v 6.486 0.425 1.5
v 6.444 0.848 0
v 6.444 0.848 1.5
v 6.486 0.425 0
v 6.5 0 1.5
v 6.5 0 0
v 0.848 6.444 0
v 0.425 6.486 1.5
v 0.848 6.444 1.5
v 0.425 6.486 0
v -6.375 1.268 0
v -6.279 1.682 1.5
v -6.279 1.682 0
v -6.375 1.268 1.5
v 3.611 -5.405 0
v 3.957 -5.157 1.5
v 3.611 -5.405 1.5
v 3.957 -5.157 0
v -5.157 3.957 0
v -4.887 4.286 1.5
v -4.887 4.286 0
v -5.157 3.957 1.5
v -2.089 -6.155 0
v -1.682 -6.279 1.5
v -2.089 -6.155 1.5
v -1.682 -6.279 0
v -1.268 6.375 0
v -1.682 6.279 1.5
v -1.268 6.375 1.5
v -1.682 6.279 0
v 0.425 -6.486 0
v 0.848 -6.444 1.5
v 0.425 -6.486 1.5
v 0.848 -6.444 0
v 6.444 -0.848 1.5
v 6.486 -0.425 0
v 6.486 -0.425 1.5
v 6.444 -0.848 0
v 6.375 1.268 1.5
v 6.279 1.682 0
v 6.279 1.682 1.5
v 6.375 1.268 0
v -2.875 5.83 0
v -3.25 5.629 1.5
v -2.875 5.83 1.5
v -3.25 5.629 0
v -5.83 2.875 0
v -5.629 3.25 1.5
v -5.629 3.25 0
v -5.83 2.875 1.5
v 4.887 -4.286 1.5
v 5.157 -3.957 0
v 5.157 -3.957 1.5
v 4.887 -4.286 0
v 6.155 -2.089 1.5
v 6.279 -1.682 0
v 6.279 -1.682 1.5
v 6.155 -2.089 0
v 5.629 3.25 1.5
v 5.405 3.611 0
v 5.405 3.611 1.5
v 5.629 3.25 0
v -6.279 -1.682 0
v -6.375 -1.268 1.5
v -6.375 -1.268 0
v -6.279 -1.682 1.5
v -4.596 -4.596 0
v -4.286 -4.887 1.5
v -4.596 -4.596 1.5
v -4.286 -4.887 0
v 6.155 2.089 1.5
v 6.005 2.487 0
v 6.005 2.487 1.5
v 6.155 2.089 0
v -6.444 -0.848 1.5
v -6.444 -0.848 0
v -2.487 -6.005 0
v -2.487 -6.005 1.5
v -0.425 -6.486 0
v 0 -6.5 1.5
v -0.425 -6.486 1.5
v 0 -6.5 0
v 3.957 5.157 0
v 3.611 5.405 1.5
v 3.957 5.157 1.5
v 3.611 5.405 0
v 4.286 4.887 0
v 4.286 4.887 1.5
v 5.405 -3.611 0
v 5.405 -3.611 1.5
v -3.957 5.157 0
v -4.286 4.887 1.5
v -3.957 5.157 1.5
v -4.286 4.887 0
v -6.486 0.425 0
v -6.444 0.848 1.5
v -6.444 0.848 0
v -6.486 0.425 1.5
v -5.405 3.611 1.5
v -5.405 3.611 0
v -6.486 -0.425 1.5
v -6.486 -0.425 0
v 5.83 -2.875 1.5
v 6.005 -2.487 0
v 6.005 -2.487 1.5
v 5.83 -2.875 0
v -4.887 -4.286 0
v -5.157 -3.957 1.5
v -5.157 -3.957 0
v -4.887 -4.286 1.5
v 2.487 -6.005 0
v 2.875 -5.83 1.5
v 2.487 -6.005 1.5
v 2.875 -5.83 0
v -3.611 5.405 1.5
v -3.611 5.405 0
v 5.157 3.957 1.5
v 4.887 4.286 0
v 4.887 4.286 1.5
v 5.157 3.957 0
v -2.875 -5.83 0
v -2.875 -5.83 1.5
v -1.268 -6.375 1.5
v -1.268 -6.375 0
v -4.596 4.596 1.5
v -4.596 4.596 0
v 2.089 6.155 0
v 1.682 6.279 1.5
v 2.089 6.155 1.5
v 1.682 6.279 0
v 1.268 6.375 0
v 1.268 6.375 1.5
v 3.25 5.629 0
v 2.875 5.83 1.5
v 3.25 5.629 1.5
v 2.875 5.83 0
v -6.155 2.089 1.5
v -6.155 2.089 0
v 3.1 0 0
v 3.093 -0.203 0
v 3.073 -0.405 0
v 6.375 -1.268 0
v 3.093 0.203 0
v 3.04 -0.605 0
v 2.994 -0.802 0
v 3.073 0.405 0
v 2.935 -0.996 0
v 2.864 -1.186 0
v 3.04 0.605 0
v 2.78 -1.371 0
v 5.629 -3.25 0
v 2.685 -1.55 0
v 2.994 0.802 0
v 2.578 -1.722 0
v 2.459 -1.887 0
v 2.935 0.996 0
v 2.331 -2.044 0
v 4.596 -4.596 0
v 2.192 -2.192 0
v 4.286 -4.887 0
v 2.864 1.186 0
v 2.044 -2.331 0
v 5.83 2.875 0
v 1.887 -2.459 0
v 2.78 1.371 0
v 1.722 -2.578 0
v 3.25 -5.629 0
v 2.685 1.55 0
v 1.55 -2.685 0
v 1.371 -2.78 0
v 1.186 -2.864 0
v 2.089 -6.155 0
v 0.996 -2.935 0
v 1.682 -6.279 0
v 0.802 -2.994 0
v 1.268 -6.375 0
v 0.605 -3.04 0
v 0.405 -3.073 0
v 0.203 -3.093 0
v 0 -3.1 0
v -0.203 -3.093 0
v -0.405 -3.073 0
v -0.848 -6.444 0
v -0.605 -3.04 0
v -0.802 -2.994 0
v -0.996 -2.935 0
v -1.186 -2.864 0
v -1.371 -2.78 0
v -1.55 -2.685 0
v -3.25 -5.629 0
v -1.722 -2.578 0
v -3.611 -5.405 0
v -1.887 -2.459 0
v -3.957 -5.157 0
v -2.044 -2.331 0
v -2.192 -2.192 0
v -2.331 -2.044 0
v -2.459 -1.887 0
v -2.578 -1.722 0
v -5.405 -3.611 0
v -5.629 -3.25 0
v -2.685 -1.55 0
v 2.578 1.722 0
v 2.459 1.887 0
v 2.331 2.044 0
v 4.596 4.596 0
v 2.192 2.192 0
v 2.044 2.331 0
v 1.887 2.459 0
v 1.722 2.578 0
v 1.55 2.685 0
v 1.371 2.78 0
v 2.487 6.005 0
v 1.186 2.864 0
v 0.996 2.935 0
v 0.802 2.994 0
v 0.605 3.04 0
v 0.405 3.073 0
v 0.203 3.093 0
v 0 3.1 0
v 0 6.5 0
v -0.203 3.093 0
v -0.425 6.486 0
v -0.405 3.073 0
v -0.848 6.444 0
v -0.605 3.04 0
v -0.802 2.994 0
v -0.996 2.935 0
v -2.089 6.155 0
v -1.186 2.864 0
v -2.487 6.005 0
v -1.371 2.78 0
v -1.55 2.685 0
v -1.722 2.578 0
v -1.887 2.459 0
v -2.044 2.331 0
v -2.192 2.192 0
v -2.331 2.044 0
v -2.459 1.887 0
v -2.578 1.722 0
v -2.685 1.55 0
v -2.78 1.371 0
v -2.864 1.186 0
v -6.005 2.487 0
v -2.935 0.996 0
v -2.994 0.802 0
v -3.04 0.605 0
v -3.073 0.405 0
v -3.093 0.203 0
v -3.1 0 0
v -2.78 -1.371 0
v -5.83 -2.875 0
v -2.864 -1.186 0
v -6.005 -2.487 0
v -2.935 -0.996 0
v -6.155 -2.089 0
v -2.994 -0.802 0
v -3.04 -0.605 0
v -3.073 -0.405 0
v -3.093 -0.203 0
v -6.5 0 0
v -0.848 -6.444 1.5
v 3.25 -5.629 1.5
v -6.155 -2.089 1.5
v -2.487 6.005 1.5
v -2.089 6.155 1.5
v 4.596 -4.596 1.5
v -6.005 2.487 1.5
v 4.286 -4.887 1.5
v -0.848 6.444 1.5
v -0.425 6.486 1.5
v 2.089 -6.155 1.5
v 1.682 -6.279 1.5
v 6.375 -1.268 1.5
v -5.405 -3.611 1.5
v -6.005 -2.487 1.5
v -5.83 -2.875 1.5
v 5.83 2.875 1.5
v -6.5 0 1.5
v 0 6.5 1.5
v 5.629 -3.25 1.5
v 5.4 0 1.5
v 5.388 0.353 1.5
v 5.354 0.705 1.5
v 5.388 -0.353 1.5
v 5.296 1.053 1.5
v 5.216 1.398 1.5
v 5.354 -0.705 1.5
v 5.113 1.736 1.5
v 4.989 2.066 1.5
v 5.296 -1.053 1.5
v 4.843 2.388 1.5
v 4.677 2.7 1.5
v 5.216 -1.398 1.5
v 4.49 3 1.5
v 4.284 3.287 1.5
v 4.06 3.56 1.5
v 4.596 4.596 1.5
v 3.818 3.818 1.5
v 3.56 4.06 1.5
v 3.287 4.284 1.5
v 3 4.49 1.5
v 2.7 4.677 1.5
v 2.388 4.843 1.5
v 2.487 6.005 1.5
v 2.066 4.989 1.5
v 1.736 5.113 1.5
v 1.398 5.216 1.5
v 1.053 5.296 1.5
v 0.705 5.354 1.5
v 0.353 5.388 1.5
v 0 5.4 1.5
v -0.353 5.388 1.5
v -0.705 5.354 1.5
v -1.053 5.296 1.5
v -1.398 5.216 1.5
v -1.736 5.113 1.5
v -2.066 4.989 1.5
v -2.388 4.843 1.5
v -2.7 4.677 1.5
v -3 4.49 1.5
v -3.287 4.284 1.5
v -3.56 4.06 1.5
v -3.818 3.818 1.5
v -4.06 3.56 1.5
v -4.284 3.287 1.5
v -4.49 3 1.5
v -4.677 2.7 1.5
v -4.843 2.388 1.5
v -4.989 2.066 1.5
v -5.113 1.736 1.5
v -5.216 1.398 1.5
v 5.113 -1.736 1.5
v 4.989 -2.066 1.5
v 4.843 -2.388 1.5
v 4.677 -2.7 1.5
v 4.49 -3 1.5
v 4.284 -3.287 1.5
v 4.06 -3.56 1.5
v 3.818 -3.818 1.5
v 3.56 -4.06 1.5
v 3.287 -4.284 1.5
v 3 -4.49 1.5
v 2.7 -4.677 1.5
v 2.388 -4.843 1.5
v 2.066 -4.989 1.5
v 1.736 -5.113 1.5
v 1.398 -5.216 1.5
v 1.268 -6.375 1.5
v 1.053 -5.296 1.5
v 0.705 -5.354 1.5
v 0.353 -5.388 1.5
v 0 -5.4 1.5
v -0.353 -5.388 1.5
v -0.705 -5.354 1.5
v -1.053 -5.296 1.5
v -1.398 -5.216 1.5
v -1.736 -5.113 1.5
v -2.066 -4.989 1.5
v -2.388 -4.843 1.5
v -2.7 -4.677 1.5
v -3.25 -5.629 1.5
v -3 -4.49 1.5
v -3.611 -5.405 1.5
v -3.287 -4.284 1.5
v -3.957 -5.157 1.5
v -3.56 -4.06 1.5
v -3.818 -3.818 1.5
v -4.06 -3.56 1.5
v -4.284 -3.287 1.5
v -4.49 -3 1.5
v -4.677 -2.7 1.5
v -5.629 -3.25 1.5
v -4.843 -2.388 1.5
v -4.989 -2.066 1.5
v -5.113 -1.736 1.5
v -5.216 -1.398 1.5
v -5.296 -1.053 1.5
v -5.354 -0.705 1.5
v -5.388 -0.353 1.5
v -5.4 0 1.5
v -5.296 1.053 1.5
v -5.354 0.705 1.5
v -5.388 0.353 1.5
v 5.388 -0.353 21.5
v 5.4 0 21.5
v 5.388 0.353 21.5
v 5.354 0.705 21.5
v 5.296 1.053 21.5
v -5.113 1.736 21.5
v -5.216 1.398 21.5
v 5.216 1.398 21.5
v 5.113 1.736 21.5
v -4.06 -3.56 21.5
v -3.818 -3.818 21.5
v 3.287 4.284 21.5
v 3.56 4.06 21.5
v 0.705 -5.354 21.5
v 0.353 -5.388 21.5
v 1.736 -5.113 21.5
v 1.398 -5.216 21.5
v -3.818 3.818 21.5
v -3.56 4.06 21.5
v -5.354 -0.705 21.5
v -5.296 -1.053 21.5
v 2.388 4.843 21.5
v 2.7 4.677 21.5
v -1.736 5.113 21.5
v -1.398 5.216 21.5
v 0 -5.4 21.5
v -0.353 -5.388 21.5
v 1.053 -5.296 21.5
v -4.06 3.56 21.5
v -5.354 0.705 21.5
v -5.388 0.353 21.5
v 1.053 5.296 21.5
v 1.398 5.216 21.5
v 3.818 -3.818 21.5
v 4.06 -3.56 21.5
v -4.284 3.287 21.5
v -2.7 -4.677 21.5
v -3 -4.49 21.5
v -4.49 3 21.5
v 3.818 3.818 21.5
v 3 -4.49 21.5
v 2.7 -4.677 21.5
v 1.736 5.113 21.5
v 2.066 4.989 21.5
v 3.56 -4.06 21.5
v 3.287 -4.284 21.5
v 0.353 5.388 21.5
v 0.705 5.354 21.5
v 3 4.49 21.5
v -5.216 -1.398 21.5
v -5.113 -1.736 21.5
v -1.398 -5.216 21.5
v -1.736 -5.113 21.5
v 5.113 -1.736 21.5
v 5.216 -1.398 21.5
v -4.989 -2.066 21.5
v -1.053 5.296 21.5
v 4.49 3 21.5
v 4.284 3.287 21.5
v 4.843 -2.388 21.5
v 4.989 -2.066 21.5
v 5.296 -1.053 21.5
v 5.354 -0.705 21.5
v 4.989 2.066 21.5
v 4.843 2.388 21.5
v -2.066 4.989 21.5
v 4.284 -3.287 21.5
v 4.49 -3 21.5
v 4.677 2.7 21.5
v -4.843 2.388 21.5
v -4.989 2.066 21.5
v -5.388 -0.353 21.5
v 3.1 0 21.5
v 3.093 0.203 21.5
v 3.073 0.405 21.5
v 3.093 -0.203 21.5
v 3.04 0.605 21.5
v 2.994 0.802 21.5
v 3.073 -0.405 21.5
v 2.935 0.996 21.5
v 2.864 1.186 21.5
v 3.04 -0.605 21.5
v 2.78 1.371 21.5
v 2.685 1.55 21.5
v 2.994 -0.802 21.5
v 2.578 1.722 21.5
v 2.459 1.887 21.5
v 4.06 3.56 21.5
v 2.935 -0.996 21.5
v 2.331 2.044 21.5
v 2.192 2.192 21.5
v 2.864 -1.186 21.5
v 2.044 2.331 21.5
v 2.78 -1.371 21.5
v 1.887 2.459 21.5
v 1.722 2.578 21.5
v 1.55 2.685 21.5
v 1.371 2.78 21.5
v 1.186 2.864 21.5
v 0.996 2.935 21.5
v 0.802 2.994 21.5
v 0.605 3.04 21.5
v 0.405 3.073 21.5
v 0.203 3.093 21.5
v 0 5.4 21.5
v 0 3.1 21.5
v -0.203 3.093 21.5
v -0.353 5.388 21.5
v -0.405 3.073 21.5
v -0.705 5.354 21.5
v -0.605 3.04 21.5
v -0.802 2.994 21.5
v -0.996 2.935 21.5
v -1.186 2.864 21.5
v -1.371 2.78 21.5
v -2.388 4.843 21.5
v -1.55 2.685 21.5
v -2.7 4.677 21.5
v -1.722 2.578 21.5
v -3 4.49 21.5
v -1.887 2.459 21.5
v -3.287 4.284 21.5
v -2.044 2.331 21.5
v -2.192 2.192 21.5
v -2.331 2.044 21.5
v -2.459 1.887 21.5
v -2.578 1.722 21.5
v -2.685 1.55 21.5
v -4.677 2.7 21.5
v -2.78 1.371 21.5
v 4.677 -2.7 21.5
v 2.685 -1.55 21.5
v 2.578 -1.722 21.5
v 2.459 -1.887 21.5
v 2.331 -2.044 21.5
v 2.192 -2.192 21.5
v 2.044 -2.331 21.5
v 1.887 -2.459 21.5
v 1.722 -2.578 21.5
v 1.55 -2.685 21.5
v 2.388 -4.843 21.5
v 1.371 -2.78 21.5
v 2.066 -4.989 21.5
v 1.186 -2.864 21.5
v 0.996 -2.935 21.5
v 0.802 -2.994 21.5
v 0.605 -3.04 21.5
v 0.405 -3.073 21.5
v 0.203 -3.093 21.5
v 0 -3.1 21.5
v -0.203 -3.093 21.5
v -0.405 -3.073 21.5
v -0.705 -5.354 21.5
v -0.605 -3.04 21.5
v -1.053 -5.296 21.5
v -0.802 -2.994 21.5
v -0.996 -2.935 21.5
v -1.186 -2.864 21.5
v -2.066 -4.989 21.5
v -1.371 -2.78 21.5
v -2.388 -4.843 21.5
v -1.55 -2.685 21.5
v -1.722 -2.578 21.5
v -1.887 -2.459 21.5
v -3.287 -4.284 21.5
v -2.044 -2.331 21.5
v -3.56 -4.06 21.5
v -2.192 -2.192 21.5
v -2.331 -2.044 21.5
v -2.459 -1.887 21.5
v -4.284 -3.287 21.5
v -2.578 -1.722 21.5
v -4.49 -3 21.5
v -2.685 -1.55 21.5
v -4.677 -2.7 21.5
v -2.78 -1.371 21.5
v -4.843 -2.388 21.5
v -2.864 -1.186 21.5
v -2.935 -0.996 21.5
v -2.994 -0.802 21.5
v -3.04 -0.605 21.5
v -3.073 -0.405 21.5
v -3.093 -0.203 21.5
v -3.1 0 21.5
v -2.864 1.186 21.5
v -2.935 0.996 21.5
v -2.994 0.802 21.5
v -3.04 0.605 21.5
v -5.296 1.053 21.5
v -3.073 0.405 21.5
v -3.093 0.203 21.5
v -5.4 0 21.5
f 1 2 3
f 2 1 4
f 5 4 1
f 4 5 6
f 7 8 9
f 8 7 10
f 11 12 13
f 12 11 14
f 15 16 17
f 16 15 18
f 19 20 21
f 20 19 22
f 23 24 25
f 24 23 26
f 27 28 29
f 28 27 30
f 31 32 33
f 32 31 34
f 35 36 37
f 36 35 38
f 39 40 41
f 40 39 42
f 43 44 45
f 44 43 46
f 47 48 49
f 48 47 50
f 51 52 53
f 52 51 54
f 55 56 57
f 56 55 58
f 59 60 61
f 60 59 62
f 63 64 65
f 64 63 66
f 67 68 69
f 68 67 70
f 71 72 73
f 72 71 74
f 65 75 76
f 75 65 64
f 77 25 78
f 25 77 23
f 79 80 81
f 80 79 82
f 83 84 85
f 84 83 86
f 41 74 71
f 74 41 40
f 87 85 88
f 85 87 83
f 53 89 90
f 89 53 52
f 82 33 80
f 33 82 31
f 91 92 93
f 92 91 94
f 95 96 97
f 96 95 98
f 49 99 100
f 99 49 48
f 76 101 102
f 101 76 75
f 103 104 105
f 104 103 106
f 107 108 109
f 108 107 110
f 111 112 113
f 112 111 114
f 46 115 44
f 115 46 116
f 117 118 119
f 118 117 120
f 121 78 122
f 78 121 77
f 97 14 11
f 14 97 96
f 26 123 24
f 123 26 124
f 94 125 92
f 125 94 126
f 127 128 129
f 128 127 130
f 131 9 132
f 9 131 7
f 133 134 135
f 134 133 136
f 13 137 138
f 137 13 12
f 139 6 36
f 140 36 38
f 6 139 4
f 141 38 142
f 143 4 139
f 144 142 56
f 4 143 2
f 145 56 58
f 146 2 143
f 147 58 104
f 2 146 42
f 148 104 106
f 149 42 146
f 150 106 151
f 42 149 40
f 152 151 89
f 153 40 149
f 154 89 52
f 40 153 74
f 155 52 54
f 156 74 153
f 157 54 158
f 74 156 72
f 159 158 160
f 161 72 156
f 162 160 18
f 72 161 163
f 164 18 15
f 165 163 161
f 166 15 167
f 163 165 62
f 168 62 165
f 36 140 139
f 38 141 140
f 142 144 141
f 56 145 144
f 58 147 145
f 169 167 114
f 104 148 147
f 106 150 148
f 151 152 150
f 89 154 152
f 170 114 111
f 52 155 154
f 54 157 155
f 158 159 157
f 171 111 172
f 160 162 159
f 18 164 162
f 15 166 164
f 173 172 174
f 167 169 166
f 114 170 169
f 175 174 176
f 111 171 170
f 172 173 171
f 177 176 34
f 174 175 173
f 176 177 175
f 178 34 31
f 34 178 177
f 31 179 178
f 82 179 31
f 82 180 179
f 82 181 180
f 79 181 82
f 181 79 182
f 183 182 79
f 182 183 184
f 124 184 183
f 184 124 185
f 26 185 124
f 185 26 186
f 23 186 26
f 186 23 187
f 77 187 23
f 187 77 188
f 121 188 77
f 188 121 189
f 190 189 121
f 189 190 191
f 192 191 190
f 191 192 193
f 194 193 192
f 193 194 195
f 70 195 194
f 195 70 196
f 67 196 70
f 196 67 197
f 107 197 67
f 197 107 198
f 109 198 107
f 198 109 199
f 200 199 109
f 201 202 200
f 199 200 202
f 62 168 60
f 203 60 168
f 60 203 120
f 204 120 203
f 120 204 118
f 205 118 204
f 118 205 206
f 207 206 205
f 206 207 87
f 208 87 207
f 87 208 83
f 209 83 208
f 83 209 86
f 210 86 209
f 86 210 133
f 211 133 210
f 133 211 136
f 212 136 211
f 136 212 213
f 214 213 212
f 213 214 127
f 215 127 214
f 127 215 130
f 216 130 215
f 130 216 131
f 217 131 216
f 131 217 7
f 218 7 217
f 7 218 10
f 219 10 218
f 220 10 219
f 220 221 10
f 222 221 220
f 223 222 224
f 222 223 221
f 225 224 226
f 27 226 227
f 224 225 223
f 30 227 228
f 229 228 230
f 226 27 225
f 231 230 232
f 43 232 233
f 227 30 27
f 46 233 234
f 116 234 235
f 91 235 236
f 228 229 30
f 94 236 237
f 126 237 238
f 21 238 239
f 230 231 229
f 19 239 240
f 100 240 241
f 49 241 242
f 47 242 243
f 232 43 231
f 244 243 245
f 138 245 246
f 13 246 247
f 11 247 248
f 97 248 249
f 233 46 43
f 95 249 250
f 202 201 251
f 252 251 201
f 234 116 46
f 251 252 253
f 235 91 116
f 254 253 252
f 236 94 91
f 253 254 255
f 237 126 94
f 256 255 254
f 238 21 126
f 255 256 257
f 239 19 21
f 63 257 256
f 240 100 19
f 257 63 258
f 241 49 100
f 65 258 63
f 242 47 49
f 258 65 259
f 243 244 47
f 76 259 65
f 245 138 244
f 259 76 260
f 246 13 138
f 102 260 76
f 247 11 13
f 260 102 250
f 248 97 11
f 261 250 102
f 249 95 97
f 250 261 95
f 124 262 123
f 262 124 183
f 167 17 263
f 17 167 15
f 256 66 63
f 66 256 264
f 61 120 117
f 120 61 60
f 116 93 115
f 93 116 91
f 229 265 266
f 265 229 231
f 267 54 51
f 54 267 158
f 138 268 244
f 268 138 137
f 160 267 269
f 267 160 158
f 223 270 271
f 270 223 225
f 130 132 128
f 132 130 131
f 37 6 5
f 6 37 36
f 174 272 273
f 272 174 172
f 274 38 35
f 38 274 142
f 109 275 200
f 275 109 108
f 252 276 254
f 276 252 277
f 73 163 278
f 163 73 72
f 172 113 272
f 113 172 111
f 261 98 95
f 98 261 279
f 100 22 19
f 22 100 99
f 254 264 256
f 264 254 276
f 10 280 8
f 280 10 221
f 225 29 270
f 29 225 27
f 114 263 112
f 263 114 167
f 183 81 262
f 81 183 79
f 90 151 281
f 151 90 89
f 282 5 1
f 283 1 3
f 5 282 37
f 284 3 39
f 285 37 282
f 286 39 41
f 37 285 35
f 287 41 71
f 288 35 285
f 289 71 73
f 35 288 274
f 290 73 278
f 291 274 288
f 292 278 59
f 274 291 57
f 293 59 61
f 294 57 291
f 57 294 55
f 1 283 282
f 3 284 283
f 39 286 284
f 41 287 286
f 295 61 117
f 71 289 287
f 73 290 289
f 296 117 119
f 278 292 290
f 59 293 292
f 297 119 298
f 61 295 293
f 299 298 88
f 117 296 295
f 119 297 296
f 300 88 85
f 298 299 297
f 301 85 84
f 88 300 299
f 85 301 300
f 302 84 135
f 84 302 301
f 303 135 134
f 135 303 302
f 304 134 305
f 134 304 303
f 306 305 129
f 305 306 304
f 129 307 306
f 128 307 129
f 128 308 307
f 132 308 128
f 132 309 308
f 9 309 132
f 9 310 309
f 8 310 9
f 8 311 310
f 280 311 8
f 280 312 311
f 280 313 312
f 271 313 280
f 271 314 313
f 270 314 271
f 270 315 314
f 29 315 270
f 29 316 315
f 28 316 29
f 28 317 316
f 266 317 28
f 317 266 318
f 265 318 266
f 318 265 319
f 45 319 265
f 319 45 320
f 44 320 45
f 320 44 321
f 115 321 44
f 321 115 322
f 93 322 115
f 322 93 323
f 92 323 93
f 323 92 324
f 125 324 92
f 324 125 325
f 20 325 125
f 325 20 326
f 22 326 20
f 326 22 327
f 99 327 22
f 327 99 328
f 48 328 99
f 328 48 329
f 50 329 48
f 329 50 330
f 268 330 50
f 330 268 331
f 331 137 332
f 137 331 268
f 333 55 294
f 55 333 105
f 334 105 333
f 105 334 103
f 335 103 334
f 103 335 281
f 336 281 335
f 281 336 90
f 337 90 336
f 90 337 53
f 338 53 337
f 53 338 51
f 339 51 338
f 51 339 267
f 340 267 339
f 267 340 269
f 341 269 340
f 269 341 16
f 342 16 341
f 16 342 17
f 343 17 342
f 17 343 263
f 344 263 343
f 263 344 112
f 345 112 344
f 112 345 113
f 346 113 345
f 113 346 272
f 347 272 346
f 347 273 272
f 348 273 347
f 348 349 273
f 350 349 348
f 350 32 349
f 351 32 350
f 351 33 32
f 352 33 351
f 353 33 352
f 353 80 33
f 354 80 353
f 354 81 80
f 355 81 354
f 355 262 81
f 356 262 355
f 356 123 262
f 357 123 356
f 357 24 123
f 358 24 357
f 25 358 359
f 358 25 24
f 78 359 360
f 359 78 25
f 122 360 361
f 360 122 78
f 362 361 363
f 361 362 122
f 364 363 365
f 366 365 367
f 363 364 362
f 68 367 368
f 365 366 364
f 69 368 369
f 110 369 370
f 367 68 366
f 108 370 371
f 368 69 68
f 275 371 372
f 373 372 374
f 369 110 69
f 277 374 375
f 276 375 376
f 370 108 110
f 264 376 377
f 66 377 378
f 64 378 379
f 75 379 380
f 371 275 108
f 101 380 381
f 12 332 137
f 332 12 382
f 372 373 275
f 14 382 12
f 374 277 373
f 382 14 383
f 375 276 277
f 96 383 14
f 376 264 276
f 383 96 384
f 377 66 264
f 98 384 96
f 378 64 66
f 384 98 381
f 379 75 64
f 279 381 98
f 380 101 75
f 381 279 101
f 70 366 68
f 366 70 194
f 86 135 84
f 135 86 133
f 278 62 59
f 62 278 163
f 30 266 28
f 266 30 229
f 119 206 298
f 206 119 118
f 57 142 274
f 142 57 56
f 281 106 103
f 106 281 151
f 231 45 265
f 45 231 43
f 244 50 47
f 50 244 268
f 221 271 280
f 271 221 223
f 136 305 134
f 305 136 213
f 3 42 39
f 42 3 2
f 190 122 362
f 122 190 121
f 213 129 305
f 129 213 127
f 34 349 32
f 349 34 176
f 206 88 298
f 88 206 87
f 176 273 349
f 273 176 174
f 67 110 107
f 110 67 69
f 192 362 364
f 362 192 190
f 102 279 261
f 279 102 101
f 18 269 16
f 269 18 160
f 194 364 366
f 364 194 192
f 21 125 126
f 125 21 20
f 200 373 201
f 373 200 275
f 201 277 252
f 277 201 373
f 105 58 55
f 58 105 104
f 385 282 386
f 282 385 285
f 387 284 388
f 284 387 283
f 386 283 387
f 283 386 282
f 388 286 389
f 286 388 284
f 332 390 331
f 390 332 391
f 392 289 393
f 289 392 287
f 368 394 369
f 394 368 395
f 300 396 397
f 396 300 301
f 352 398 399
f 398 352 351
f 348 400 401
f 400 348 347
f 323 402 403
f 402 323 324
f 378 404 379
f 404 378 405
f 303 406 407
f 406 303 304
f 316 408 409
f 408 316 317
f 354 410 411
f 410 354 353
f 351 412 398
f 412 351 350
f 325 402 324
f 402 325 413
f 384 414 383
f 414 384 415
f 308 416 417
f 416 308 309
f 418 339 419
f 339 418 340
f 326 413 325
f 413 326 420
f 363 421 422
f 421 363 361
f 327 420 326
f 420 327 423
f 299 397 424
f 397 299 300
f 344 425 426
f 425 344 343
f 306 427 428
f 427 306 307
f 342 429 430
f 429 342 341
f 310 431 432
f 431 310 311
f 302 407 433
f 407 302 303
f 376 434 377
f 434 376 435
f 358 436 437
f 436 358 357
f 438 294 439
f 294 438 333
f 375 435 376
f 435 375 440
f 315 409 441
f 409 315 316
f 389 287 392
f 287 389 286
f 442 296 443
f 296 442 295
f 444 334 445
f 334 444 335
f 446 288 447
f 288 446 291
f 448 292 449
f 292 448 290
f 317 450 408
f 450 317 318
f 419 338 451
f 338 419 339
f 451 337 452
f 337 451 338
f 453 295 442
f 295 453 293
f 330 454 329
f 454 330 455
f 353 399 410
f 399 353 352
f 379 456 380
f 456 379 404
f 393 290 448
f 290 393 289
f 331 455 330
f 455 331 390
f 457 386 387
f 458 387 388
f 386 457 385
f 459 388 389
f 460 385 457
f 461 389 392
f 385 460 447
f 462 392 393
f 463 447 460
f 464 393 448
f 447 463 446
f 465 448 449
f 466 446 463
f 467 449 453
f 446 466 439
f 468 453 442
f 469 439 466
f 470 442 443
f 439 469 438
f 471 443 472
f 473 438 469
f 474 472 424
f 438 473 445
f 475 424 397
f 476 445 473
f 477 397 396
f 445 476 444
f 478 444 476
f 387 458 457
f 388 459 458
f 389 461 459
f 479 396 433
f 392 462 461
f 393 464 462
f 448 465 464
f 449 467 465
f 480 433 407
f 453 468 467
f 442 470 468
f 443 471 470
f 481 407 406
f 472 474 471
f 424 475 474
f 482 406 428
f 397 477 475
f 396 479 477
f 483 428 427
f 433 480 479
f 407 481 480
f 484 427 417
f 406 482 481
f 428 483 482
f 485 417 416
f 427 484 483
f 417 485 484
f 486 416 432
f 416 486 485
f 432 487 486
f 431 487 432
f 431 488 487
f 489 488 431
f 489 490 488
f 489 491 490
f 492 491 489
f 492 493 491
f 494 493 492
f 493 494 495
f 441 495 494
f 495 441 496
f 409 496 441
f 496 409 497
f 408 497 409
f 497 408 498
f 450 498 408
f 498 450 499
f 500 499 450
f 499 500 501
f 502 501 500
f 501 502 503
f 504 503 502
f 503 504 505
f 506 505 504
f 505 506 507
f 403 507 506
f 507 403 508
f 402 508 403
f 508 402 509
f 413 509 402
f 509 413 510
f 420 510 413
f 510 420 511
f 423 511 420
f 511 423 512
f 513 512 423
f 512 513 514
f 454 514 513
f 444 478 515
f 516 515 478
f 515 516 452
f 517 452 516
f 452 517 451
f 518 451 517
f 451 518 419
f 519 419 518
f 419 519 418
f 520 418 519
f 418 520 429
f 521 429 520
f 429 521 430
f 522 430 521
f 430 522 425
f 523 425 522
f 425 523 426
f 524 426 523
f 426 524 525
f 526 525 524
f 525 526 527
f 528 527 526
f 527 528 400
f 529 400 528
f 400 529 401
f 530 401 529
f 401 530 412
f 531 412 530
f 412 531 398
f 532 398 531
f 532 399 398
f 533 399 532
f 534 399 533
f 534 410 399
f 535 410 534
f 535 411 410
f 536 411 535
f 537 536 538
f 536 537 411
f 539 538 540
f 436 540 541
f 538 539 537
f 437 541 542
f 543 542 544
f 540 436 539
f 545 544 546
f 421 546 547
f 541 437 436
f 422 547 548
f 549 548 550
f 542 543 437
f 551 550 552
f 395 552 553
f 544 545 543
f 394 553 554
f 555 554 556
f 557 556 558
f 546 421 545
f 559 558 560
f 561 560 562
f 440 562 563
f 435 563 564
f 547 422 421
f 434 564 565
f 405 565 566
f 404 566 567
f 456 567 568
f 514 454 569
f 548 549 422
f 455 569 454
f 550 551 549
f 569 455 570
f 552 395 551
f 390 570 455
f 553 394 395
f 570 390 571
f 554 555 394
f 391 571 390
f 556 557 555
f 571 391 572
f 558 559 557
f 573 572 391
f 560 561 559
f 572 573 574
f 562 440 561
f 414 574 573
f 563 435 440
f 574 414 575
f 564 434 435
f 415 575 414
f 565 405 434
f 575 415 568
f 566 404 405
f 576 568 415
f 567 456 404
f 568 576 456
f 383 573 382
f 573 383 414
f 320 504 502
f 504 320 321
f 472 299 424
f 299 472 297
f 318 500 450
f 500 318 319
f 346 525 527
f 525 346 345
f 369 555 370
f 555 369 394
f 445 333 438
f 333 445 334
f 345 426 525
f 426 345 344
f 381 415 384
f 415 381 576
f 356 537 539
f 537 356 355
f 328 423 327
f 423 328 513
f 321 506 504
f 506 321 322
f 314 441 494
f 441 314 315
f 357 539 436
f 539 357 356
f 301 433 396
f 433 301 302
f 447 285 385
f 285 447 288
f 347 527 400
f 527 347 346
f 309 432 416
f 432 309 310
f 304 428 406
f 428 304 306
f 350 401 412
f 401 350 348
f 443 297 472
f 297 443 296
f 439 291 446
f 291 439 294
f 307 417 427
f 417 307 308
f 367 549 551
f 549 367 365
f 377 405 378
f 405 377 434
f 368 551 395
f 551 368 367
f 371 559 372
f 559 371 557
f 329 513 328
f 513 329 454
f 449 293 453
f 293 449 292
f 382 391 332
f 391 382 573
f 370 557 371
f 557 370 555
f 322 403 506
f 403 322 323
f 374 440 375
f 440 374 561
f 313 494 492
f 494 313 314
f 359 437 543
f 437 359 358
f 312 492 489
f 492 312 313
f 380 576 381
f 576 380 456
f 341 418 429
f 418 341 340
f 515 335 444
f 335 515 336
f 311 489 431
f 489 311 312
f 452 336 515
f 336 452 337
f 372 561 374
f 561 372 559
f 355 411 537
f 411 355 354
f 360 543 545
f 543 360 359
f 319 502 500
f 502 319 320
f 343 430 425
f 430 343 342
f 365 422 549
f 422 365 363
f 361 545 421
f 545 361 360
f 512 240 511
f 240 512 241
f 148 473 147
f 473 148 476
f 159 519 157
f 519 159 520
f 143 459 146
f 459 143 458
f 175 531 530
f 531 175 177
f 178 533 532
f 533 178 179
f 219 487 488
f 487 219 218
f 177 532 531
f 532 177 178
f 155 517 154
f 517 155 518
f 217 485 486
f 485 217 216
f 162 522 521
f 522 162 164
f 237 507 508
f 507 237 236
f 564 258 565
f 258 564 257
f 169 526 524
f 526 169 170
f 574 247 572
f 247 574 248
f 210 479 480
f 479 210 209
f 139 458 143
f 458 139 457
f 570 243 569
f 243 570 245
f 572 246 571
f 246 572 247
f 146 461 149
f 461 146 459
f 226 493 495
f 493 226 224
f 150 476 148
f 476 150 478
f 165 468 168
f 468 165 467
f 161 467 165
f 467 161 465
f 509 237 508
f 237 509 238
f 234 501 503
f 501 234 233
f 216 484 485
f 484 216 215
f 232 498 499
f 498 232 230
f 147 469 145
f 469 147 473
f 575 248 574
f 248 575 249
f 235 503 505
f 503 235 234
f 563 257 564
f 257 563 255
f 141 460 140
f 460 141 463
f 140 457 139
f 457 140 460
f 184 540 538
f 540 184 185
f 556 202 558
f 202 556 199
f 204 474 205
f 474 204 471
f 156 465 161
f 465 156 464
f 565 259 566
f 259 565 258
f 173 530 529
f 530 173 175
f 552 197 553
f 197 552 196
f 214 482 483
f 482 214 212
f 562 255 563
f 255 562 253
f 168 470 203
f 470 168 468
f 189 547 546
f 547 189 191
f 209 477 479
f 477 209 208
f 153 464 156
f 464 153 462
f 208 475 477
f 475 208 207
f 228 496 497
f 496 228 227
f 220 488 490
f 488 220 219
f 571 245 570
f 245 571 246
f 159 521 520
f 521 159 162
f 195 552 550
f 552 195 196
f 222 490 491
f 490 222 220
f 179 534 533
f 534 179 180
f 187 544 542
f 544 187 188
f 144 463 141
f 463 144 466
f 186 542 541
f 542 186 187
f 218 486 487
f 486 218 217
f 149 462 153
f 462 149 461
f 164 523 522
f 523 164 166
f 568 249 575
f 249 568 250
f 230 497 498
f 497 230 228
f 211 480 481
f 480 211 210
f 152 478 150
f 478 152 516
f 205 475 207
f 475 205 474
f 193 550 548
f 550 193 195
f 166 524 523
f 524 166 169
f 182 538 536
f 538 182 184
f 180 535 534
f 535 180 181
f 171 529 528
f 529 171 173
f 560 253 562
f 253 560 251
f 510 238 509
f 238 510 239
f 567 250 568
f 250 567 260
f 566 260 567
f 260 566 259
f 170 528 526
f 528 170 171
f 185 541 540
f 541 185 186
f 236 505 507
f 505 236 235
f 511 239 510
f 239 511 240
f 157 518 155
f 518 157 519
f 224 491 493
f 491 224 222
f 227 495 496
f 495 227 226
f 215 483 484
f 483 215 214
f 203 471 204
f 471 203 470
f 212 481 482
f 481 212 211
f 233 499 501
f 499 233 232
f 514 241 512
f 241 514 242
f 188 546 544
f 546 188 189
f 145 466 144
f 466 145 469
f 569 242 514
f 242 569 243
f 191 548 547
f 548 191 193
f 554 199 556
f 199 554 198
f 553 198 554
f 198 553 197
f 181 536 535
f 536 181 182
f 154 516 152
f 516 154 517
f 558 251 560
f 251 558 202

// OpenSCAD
// PCR tube adapter sleeve - fits a 0.2 mL tube into a 1.5 mL rack hole
// Print orientation: collar on the bed (z = 0), sleeve body rises to z = 21.5

// ---------------- Parameters ----------------
collar_d        = 13;     // collar outer diameter
collar_h        = 1.5;    // collar thickness (z = 0 to 1.5)
sleeve_od       = 10.8;   // sleeve body outer diameter
sleeve_top_z    = 21.5;   // top of sleeve body
bore_d          = 6.2;    // through-bore diameter
eps             = 0.5;    // cutter overshoot past faces
$fn             = 96;     // curve resolution

// Derived
sleeve_h = sleeve_top_z - collar_h;  // sleeve body height (20.0 mm)

// ---------------- Model ----------------
difference() {
    union() {
        // Collar
        cylinder(d = collar_d, h = collar_h);
        // Sleeve body (slightly overlapping the collar for a clean union)
        translate([0, 0, collar_h - 0.01])
            cylinder(d = sleeve_od, h = sleeve_h + 0.01);
    }
    // Full-height through bore
    translate([0, 0, -eps])
        cylinder(d = bore_d, h = sleeve_top_z + 2 * eps);
}
